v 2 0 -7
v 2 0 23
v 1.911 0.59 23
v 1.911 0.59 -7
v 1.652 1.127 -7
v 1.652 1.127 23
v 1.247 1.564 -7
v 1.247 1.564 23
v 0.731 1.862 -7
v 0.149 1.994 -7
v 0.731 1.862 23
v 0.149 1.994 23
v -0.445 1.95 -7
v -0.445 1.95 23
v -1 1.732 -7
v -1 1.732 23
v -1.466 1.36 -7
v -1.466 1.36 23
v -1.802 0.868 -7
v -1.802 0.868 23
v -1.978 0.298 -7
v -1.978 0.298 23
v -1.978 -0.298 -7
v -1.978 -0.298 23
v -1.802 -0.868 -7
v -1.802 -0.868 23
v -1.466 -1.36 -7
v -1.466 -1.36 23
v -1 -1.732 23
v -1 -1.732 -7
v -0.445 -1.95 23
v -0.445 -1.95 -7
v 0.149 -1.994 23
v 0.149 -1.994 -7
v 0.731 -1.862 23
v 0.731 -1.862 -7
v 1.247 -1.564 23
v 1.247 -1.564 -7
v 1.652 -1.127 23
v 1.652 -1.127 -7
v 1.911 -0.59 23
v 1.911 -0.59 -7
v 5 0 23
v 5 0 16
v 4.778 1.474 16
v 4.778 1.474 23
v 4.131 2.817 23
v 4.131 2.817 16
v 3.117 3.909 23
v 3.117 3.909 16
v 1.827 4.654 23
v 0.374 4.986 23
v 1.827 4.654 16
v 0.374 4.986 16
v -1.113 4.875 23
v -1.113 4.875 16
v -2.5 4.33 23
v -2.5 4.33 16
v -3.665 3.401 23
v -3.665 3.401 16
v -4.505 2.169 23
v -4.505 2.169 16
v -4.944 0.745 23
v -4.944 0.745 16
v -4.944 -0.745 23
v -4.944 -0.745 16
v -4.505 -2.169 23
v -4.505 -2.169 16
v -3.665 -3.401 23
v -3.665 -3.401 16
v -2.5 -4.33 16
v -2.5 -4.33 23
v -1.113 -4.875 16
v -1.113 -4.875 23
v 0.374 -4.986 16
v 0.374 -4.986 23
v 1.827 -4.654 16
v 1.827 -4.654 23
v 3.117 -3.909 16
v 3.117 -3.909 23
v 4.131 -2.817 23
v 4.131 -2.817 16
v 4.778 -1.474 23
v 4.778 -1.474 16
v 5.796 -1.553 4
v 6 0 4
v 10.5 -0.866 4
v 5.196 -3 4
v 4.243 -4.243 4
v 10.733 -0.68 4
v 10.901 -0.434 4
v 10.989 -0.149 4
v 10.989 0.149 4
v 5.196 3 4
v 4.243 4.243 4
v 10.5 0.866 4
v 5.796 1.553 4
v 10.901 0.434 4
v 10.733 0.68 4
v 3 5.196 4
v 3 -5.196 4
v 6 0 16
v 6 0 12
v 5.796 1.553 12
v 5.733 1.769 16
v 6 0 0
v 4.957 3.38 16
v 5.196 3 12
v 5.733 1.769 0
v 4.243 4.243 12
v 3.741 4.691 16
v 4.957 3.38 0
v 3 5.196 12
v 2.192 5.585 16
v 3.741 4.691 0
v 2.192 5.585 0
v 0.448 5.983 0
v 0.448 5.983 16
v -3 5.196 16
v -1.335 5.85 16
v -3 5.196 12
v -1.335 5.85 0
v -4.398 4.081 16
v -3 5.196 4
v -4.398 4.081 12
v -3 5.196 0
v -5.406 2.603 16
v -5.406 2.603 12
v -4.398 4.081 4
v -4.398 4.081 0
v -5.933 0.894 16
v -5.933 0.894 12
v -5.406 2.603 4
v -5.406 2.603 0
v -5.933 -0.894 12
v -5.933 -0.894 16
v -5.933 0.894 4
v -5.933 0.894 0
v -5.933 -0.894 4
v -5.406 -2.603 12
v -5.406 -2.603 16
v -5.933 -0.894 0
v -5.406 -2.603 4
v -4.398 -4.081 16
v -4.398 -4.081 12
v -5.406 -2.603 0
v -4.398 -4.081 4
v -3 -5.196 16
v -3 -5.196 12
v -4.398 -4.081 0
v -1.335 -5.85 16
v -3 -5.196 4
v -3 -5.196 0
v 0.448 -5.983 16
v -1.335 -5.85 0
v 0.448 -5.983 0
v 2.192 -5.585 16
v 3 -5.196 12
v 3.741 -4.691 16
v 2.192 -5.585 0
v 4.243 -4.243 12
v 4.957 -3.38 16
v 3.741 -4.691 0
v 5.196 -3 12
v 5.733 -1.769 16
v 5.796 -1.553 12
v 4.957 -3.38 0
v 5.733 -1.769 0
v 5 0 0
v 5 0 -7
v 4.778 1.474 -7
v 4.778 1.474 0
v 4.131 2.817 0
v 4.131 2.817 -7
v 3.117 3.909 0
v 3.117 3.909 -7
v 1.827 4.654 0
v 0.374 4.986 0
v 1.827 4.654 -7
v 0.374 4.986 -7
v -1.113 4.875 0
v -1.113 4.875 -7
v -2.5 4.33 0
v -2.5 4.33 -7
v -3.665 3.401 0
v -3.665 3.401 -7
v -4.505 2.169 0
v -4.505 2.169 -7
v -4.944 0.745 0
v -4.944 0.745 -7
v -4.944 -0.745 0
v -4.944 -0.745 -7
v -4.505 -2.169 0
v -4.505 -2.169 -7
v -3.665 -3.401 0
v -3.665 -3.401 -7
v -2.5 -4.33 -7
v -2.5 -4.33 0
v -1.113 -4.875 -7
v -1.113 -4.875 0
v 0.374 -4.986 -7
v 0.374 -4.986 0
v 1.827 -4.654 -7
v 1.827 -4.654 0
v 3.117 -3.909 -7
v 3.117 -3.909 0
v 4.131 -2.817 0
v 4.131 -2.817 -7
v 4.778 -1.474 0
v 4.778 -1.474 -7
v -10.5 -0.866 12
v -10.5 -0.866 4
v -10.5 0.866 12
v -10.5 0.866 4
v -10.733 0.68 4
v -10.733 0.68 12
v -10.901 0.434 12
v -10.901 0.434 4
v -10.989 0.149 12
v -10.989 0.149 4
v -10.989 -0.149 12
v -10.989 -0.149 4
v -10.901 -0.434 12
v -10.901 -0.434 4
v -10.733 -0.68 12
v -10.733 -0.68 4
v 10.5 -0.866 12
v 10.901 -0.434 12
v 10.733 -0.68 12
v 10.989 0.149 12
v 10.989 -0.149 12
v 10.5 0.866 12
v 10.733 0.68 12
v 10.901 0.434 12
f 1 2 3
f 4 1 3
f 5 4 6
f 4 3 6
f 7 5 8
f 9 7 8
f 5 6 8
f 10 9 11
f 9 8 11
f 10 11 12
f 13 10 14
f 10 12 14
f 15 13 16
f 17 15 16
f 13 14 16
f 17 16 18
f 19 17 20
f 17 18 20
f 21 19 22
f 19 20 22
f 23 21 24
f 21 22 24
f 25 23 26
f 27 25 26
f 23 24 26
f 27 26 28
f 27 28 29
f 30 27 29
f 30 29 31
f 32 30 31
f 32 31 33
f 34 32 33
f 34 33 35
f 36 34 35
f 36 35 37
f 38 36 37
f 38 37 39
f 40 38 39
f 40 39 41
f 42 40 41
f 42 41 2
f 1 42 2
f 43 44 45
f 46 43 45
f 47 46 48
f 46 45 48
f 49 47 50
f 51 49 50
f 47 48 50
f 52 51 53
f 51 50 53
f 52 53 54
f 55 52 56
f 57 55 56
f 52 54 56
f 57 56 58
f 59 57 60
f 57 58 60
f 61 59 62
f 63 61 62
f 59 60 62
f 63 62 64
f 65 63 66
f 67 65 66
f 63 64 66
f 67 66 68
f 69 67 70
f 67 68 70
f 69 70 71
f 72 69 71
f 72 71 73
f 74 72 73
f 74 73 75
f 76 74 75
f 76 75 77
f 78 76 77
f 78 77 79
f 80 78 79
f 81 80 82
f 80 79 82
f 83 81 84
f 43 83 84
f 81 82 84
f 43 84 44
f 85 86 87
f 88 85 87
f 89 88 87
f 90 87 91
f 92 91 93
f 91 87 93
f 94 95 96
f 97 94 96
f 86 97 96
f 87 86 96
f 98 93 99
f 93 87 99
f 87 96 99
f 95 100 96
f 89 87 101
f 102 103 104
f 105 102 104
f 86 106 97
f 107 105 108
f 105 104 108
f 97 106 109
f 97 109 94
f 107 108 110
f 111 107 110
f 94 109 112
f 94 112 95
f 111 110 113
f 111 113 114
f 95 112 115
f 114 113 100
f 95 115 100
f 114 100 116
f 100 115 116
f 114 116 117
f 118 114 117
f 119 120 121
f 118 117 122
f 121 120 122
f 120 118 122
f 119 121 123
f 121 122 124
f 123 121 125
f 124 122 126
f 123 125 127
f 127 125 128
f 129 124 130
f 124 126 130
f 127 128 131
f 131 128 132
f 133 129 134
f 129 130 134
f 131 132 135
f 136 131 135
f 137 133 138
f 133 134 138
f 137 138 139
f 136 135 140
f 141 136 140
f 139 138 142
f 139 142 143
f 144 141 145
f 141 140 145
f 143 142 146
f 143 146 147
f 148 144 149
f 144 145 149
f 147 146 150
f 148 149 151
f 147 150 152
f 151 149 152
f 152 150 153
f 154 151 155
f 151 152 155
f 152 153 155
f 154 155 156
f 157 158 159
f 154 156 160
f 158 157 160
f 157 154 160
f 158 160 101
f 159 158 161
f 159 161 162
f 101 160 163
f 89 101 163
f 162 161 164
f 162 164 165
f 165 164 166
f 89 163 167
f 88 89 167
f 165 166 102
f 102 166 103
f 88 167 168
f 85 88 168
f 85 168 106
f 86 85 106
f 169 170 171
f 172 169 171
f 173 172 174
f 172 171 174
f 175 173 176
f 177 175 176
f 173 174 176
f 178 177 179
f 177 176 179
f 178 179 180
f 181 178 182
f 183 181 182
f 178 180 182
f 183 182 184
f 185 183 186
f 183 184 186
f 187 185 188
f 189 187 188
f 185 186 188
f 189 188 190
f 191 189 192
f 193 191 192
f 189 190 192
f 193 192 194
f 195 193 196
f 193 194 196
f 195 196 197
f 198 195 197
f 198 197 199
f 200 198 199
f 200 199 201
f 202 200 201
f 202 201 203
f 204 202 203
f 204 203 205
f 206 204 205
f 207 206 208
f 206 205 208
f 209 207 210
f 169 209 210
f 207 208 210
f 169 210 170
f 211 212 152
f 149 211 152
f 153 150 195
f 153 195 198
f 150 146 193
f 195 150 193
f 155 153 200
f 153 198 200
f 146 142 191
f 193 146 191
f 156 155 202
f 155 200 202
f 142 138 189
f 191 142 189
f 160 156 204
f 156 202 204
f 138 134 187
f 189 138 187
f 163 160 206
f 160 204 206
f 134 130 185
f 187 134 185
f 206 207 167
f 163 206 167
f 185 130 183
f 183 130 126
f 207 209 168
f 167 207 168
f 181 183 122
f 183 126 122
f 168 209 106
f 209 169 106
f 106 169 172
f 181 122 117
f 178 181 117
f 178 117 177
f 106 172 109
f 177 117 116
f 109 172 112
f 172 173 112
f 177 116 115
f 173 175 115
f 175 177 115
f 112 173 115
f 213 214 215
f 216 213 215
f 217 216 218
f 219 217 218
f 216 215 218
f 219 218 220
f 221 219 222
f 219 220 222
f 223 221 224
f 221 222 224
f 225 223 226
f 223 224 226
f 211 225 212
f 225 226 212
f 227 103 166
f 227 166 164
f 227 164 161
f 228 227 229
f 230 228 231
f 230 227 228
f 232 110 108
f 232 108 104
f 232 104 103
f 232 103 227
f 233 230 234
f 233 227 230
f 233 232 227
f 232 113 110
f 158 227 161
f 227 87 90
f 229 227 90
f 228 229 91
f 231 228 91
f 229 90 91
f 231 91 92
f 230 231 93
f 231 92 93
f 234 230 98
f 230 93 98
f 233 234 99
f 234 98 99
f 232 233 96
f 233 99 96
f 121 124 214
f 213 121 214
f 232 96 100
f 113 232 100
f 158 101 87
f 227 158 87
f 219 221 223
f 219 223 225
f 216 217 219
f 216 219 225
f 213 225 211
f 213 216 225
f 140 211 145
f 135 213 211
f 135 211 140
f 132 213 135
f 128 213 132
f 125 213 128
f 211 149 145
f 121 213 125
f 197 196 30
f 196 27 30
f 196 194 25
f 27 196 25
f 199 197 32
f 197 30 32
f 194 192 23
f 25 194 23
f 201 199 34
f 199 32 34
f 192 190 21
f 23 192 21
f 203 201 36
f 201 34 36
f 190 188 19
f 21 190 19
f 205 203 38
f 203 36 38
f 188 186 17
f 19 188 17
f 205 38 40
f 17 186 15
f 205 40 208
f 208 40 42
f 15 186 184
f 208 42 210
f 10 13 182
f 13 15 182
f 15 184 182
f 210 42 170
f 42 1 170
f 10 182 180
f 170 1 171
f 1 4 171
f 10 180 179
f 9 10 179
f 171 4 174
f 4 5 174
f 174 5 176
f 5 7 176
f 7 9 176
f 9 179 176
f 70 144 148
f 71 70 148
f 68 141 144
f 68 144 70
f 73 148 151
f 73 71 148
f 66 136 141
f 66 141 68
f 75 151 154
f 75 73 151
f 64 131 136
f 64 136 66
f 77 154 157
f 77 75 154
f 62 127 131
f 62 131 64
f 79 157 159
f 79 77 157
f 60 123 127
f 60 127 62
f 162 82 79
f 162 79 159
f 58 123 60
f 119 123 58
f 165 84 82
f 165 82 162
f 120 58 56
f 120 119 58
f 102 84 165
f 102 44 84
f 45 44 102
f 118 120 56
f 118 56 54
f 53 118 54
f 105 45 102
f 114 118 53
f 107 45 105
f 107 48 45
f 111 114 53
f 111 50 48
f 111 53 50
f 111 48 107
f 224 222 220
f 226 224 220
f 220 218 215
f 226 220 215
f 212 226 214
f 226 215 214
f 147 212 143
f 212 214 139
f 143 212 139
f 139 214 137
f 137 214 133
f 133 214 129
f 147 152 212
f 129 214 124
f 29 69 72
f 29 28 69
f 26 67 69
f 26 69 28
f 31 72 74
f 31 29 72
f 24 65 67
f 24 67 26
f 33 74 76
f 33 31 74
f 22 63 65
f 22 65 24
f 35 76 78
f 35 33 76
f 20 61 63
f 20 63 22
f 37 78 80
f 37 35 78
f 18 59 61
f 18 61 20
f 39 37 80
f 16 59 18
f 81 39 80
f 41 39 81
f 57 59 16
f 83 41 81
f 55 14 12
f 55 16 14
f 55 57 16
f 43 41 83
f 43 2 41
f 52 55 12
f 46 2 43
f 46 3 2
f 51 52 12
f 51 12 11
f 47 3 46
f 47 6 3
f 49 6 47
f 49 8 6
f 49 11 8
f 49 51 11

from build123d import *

# Parameters (mm, degrees)
SKETCH_1_R          = 6
EXTRUDE_1_DEPTH     = 16
EXTRUDE_START       = 4
EXTRUDE_6_DEPTH     = 8
SKETCH_9_R          = 5
EXTRUDE_7_DEPTH     = 7
EXTRUDE_START_2     = -23
SKETCH_9_2_R        = 5
EXTRUDE_8_DEPTH     = 7
SKETCH_11_R         = 2
CUT_EXTRUDE_1_DEPTH = 33.511536414


with BuildPart() as part:
    # 草图1 → 凸台-拉伸1 (new body)
    with BuildSketch(Plane.XY):
        Circle(SKETCH_1_R)
    extrude(amount=EXTRUDE_1_DEPTH)

    # 草图8 → 凸台-拉伸6 (add)
    with BuildSketch(Plane.XY.offset(EXTRUDE_START)):
        with BuildLine():
            Line((10.5, 0.866025404), (3, 5.196152423))
            ThreePointArc((3, 5.196152423), (6, 0), (3, -5.196152423))
            Line((3, -5.196152423), (10.5, -0.866025404))
            ThreePointArc((10.5, -0.866025404), (11, 0), (10.5, 0.866025404))
        make_face()
        with BuildLine():
            Line((-10.5, -0.866025404), (-3, -5.196152423))
            ThreePointArc((-3, -5.196152423), (-6, 0), (-3, 5.196152423))
            Line((-3, 5.196152423), (-10.5, 0.866025404))
            ThreePointArc((-10.5, 0.866025404), (-11, 0), (-10.5, -0.866025404))
        make_face()
    extrude(amount=EXTRUDE_6_DEPTH)

    # 草图9 → 凸台-拉伸7 (add)
    with BuildSketch(Plane.XY.offset(16)):
        Circle(SKETCH_9_R)
    extrude(amount=EXTRUDE_7_DEPTH)

    # 草图9<2> → 凸台-拉伸8 (add)
    with BuildSketch(Plane.XY.offset(16).offset(EXTRUDE_START_2)):
        Circle(SKETCH_9_2_R)
    extrude(amount=EXTRUDE_8_DEPTH)

    # 草图11 → 切除-拉伸1 (cut, through all)
    with BuildSketch(Plane.XY.offset(23)):
        Circle(SKETCH_11_R)
    extrude(amount=-CUT_EXTRUDE_1_DEPTH, mode=Mode.SUBTRACT)


solid = part.part
